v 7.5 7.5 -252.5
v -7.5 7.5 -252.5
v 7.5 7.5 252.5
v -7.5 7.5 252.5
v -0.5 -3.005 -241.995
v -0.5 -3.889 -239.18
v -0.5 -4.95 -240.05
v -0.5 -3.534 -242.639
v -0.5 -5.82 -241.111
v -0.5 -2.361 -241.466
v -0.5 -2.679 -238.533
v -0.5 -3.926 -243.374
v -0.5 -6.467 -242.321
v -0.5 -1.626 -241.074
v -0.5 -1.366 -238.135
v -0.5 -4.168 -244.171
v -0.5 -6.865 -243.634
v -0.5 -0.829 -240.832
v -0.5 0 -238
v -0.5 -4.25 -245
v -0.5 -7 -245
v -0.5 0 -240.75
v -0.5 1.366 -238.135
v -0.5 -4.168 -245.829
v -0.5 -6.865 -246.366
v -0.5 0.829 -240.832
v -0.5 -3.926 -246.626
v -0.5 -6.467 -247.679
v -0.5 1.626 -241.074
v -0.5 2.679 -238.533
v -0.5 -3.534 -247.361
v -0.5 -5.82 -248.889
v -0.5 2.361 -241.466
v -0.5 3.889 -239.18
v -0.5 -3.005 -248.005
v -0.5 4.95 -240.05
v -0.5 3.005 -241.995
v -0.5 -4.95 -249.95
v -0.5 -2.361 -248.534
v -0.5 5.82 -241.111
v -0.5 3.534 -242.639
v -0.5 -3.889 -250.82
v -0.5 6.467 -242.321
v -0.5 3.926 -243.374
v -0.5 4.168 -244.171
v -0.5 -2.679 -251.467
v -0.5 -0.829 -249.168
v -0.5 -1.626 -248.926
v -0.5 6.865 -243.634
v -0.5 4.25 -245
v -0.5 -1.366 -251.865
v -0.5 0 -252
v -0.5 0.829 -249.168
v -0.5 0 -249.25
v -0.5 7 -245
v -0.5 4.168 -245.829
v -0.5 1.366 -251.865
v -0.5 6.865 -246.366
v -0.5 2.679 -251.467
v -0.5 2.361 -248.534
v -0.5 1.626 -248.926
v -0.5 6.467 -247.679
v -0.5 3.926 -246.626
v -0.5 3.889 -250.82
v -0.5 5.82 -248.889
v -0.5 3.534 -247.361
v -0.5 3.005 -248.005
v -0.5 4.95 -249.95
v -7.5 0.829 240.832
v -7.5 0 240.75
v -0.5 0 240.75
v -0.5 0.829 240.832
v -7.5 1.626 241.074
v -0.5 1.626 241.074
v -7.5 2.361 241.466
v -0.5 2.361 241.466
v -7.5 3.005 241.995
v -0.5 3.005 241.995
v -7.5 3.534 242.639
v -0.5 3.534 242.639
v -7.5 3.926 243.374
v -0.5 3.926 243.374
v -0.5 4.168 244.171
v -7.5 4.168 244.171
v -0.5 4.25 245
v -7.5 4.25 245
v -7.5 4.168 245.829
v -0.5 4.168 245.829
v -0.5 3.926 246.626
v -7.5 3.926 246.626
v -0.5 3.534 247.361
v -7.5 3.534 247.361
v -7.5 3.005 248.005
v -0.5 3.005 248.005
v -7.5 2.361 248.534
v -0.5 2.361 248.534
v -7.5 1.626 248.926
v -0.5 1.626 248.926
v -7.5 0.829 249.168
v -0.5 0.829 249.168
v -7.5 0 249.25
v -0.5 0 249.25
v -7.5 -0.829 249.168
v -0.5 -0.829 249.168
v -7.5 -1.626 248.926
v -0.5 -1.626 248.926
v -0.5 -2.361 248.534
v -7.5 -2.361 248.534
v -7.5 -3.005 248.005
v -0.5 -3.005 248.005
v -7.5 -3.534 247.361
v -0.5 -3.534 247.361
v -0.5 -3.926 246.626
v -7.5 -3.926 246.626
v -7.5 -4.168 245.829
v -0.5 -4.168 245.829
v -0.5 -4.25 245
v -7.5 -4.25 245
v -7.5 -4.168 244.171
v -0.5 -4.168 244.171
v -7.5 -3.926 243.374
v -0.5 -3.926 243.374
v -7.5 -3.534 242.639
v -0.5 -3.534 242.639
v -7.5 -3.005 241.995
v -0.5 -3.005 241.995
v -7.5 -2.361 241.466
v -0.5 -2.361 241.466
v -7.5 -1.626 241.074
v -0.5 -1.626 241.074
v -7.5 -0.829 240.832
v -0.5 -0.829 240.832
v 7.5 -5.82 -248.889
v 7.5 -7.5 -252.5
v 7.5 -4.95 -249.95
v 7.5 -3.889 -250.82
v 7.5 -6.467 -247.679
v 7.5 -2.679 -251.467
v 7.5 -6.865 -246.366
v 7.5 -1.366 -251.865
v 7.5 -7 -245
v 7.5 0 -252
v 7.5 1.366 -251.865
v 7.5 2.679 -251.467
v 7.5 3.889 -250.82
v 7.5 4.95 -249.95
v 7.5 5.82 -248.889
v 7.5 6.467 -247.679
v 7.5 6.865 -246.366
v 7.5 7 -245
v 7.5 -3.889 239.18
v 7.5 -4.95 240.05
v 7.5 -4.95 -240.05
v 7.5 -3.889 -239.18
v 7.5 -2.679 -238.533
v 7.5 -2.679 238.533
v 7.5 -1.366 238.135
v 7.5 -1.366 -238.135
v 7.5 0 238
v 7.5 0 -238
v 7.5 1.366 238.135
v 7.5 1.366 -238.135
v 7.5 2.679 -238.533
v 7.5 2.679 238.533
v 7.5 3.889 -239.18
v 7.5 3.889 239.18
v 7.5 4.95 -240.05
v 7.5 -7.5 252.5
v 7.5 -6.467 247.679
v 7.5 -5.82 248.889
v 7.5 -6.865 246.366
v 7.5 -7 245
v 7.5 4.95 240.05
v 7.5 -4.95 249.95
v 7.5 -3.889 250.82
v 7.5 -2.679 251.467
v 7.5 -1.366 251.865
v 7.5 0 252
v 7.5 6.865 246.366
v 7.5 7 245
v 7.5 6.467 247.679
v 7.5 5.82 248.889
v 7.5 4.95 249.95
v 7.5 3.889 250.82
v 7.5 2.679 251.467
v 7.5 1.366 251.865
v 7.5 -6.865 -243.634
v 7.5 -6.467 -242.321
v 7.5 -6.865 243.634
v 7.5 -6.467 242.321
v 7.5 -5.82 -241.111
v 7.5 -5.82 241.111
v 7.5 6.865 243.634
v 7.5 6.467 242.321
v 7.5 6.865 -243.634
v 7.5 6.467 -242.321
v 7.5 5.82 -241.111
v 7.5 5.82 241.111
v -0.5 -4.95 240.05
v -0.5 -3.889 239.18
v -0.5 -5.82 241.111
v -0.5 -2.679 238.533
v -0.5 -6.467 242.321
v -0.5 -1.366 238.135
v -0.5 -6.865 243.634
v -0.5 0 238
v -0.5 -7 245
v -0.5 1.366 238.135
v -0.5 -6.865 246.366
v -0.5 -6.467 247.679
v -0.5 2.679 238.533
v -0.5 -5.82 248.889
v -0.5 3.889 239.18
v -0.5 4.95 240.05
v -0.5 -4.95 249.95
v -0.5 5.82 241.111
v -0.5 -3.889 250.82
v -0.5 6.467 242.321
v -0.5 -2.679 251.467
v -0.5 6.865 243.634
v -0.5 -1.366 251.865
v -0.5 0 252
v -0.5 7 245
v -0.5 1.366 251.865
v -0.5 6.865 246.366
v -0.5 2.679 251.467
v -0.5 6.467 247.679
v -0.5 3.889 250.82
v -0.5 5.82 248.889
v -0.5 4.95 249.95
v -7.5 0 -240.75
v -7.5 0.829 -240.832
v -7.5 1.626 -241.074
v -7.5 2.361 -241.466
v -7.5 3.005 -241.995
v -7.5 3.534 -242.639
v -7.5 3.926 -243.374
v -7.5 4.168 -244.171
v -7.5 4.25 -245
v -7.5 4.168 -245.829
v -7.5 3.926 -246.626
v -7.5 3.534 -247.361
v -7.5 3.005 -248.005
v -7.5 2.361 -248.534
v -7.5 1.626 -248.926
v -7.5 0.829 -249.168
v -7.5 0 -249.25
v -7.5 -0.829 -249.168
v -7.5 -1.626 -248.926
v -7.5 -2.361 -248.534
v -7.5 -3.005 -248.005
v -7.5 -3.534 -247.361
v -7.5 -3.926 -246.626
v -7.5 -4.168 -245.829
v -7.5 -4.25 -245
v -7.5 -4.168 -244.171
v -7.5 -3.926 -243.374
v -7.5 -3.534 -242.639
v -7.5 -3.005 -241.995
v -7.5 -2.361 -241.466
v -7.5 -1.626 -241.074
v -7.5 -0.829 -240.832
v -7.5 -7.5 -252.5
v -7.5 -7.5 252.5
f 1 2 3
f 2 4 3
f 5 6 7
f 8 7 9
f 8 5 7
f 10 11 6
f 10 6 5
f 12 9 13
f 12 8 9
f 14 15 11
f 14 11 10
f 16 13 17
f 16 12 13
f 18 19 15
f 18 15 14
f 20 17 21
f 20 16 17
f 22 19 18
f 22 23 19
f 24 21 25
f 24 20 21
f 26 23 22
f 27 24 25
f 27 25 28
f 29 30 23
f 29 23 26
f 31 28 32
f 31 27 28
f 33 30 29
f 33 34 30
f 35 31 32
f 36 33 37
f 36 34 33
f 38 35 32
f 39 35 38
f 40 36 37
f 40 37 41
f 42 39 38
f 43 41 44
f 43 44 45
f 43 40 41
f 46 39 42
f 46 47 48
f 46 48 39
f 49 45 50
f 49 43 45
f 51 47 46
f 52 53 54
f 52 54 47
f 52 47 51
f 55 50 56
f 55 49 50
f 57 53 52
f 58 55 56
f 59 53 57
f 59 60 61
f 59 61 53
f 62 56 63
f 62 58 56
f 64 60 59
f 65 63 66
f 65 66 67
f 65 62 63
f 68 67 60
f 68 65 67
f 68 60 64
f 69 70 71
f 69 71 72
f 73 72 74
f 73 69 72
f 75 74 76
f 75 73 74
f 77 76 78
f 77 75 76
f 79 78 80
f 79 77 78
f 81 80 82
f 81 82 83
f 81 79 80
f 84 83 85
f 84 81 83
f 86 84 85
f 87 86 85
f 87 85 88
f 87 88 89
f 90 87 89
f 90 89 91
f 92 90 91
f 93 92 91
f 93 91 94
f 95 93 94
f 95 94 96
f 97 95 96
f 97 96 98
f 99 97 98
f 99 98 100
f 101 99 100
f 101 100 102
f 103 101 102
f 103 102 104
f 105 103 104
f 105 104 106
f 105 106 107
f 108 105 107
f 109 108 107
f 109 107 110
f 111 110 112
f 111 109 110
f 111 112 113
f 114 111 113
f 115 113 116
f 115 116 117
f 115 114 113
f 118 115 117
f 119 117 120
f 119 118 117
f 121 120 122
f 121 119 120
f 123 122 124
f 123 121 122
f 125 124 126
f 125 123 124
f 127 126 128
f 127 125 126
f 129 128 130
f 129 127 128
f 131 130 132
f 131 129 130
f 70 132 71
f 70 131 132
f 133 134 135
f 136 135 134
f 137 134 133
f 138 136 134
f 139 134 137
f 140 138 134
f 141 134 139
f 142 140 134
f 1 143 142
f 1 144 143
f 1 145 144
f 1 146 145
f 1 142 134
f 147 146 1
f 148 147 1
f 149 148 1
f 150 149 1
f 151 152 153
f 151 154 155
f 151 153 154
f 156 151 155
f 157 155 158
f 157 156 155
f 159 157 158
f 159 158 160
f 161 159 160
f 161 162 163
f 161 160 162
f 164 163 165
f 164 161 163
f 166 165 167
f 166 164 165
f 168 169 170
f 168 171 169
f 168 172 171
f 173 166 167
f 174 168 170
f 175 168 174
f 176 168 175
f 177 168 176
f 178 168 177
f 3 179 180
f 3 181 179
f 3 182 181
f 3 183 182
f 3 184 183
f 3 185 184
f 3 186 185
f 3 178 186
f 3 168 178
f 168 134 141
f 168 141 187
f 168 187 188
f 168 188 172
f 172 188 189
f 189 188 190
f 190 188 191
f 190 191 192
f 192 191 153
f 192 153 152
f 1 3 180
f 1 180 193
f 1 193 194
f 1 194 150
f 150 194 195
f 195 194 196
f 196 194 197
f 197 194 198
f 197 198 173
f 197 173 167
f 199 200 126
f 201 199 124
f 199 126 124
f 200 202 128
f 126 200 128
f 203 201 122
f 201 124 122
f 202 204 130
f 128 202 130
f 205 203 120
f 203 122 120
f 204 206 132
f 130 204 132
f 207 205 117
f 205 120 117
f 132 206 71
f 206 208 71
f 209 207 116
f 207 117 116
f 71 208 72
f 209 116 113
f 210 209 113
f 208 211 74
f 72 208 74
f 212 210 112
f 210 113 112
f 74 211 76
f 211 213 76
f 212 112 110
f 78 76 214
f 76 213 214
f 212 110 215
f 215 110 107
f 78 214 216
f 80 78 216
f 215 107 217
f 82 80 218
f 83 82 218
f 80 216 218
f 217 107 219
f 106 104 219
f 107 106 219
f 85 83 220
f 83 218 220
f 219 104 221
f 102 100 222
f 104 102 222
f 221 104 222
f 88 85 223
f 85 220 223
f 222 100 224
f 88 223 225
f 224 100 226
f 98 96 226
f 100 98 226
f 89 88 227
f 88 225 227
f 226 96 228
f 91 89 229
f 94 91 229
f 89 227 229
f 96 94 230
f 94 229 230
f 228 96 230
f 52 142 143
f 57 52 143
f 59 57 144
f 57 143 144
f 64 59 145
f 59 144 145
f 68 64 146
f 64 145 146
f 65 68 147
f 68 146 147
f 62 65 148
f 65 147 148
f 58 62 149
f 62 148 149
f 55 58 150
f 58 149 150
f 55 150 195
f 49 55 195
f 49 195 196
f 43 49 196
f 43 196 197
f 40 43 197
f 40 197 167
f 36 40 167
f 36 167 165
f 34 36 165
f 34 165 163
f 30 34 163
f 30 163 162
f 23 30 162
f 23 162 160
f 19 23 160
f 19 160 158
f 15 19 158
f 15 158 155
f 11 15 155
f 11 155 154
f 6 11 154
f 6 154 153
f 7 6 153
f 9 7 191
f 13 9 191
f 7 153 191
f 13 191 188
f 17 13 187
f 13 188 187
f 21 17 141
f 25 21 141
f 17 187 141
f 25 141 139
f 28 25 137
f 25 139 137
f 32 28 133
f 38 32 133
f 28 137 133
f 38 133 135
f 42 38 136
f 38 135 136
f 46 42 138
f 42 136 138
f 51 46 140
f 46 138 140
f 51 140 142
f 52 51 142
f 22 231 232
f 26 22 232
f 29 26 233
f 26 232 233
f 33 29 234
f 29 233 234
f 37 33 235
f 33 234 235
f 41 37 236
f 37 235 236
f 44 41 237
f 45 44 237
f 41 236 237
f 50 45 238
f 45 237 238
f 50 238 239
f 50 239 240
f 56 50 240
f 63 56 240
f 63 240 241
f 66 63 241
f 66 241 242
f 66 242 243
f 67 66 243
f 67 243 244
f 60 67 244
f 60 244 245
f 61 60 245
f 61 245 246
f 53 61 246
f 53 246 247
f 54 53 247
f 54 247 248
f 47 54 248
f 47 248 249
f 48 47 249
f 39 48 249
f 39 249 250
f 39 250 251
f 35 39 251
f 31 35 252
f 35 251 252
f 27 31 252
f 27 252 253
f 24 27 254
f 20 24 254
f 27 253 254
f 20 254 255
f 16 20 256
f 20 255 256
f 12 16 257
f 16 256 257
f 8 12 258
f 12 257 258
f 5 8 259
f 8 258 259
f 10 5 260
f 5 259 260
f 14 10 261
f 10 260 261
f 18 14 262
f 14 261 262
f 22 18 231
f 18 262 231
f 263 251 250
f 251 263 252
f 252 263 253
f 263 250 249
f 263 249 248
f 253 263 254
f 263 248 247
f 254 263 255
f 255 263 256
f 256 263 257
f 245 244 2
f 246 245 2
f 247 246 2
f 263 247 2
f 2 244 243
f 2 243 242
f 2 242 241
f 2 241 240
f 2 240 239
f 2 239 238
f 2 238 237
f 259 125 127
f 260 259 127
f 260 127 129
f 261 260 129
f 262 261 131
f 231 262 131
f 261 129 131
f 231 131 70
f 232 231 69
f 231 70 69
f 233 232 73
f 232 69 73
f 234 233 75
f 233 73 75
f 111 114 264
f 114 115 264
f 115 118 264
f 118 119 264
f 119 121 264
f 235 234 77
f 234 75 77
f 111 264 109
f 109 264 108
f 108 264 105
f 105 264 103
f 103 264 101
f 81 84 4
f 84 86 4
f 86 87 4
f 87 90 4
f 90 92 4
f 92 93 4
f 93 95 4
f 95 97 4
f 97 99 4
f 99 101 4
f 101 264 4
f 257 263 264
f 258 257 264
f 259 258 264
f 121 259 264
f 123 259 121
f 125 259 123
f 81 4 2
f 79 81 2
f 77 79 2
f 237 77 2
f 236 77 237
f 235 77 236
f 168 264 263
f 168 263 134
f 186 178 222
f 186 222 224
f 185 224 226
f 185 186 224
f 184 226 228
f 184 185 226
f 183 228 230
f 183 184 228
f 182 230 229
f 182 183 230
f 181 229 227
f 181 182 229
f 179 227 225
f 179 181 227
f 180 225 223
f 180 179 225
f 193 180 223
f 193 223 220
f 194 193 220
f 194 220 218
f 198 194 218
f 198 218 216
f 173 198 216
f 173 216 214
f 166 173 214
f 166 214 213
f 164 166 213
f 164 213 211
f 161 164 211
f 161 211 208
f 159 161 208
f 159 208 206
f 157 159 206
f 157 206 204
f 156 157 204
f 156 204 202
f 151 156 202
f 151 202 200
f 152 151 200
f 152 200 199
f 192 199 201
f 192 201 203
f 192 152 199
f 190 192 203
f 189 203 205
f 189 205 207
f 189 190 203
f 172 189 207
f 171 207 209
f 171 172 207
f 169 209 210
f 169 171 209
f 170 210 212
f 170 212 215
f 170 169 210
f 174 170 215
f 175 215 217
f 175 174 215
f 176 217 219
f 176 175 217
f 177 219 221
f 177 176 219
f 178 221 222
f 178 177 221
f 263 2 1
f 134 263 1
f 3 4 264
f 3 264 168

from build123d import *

# Parameters (mm, degrees)
IZIM1_W                     = 15
IZIM1_H                     = 15
Y_KSEKLIK_EKSTR_ZYON1_DEPTH = 252.5
DELIK2_D                    = 8.5
DELIK2_DEPTH                = 15
DELIK2_CBORE_D              = 14
DELIK2_CBORE_DEPTH          = 8


with BuildPart() as part:
    # Çizim1 → Yükseklik-Ekstrüzyon1 (new body, symmetric)
    with BuildSketch(Plane.XY):
        Rectangle(IZIM1_W, IZIM1_H)
    extrude(amount=Y_KSEKLIK_EKSTR_ZYON1_DEPTH, both=True)

    # Delik2
    with Locations(Plane(origin=(7.5, 0, 0), x_dir=(0, 0, -1), z_dir=(1, 0, 0))):
        with Locations((245, 0)):
            delik2 = CounterBoreHole(DELIK2_D / 2, DELIK2_CBORE_D / 2, DELIK2_CBORE_DEPTH, depth=DELIK2_DEPTH)

    # Aynalama1: Delik2 across plane
    add(delik2.mirror(Plane.XY), mode=Mode.SUBTRACT)


solid = part.part
